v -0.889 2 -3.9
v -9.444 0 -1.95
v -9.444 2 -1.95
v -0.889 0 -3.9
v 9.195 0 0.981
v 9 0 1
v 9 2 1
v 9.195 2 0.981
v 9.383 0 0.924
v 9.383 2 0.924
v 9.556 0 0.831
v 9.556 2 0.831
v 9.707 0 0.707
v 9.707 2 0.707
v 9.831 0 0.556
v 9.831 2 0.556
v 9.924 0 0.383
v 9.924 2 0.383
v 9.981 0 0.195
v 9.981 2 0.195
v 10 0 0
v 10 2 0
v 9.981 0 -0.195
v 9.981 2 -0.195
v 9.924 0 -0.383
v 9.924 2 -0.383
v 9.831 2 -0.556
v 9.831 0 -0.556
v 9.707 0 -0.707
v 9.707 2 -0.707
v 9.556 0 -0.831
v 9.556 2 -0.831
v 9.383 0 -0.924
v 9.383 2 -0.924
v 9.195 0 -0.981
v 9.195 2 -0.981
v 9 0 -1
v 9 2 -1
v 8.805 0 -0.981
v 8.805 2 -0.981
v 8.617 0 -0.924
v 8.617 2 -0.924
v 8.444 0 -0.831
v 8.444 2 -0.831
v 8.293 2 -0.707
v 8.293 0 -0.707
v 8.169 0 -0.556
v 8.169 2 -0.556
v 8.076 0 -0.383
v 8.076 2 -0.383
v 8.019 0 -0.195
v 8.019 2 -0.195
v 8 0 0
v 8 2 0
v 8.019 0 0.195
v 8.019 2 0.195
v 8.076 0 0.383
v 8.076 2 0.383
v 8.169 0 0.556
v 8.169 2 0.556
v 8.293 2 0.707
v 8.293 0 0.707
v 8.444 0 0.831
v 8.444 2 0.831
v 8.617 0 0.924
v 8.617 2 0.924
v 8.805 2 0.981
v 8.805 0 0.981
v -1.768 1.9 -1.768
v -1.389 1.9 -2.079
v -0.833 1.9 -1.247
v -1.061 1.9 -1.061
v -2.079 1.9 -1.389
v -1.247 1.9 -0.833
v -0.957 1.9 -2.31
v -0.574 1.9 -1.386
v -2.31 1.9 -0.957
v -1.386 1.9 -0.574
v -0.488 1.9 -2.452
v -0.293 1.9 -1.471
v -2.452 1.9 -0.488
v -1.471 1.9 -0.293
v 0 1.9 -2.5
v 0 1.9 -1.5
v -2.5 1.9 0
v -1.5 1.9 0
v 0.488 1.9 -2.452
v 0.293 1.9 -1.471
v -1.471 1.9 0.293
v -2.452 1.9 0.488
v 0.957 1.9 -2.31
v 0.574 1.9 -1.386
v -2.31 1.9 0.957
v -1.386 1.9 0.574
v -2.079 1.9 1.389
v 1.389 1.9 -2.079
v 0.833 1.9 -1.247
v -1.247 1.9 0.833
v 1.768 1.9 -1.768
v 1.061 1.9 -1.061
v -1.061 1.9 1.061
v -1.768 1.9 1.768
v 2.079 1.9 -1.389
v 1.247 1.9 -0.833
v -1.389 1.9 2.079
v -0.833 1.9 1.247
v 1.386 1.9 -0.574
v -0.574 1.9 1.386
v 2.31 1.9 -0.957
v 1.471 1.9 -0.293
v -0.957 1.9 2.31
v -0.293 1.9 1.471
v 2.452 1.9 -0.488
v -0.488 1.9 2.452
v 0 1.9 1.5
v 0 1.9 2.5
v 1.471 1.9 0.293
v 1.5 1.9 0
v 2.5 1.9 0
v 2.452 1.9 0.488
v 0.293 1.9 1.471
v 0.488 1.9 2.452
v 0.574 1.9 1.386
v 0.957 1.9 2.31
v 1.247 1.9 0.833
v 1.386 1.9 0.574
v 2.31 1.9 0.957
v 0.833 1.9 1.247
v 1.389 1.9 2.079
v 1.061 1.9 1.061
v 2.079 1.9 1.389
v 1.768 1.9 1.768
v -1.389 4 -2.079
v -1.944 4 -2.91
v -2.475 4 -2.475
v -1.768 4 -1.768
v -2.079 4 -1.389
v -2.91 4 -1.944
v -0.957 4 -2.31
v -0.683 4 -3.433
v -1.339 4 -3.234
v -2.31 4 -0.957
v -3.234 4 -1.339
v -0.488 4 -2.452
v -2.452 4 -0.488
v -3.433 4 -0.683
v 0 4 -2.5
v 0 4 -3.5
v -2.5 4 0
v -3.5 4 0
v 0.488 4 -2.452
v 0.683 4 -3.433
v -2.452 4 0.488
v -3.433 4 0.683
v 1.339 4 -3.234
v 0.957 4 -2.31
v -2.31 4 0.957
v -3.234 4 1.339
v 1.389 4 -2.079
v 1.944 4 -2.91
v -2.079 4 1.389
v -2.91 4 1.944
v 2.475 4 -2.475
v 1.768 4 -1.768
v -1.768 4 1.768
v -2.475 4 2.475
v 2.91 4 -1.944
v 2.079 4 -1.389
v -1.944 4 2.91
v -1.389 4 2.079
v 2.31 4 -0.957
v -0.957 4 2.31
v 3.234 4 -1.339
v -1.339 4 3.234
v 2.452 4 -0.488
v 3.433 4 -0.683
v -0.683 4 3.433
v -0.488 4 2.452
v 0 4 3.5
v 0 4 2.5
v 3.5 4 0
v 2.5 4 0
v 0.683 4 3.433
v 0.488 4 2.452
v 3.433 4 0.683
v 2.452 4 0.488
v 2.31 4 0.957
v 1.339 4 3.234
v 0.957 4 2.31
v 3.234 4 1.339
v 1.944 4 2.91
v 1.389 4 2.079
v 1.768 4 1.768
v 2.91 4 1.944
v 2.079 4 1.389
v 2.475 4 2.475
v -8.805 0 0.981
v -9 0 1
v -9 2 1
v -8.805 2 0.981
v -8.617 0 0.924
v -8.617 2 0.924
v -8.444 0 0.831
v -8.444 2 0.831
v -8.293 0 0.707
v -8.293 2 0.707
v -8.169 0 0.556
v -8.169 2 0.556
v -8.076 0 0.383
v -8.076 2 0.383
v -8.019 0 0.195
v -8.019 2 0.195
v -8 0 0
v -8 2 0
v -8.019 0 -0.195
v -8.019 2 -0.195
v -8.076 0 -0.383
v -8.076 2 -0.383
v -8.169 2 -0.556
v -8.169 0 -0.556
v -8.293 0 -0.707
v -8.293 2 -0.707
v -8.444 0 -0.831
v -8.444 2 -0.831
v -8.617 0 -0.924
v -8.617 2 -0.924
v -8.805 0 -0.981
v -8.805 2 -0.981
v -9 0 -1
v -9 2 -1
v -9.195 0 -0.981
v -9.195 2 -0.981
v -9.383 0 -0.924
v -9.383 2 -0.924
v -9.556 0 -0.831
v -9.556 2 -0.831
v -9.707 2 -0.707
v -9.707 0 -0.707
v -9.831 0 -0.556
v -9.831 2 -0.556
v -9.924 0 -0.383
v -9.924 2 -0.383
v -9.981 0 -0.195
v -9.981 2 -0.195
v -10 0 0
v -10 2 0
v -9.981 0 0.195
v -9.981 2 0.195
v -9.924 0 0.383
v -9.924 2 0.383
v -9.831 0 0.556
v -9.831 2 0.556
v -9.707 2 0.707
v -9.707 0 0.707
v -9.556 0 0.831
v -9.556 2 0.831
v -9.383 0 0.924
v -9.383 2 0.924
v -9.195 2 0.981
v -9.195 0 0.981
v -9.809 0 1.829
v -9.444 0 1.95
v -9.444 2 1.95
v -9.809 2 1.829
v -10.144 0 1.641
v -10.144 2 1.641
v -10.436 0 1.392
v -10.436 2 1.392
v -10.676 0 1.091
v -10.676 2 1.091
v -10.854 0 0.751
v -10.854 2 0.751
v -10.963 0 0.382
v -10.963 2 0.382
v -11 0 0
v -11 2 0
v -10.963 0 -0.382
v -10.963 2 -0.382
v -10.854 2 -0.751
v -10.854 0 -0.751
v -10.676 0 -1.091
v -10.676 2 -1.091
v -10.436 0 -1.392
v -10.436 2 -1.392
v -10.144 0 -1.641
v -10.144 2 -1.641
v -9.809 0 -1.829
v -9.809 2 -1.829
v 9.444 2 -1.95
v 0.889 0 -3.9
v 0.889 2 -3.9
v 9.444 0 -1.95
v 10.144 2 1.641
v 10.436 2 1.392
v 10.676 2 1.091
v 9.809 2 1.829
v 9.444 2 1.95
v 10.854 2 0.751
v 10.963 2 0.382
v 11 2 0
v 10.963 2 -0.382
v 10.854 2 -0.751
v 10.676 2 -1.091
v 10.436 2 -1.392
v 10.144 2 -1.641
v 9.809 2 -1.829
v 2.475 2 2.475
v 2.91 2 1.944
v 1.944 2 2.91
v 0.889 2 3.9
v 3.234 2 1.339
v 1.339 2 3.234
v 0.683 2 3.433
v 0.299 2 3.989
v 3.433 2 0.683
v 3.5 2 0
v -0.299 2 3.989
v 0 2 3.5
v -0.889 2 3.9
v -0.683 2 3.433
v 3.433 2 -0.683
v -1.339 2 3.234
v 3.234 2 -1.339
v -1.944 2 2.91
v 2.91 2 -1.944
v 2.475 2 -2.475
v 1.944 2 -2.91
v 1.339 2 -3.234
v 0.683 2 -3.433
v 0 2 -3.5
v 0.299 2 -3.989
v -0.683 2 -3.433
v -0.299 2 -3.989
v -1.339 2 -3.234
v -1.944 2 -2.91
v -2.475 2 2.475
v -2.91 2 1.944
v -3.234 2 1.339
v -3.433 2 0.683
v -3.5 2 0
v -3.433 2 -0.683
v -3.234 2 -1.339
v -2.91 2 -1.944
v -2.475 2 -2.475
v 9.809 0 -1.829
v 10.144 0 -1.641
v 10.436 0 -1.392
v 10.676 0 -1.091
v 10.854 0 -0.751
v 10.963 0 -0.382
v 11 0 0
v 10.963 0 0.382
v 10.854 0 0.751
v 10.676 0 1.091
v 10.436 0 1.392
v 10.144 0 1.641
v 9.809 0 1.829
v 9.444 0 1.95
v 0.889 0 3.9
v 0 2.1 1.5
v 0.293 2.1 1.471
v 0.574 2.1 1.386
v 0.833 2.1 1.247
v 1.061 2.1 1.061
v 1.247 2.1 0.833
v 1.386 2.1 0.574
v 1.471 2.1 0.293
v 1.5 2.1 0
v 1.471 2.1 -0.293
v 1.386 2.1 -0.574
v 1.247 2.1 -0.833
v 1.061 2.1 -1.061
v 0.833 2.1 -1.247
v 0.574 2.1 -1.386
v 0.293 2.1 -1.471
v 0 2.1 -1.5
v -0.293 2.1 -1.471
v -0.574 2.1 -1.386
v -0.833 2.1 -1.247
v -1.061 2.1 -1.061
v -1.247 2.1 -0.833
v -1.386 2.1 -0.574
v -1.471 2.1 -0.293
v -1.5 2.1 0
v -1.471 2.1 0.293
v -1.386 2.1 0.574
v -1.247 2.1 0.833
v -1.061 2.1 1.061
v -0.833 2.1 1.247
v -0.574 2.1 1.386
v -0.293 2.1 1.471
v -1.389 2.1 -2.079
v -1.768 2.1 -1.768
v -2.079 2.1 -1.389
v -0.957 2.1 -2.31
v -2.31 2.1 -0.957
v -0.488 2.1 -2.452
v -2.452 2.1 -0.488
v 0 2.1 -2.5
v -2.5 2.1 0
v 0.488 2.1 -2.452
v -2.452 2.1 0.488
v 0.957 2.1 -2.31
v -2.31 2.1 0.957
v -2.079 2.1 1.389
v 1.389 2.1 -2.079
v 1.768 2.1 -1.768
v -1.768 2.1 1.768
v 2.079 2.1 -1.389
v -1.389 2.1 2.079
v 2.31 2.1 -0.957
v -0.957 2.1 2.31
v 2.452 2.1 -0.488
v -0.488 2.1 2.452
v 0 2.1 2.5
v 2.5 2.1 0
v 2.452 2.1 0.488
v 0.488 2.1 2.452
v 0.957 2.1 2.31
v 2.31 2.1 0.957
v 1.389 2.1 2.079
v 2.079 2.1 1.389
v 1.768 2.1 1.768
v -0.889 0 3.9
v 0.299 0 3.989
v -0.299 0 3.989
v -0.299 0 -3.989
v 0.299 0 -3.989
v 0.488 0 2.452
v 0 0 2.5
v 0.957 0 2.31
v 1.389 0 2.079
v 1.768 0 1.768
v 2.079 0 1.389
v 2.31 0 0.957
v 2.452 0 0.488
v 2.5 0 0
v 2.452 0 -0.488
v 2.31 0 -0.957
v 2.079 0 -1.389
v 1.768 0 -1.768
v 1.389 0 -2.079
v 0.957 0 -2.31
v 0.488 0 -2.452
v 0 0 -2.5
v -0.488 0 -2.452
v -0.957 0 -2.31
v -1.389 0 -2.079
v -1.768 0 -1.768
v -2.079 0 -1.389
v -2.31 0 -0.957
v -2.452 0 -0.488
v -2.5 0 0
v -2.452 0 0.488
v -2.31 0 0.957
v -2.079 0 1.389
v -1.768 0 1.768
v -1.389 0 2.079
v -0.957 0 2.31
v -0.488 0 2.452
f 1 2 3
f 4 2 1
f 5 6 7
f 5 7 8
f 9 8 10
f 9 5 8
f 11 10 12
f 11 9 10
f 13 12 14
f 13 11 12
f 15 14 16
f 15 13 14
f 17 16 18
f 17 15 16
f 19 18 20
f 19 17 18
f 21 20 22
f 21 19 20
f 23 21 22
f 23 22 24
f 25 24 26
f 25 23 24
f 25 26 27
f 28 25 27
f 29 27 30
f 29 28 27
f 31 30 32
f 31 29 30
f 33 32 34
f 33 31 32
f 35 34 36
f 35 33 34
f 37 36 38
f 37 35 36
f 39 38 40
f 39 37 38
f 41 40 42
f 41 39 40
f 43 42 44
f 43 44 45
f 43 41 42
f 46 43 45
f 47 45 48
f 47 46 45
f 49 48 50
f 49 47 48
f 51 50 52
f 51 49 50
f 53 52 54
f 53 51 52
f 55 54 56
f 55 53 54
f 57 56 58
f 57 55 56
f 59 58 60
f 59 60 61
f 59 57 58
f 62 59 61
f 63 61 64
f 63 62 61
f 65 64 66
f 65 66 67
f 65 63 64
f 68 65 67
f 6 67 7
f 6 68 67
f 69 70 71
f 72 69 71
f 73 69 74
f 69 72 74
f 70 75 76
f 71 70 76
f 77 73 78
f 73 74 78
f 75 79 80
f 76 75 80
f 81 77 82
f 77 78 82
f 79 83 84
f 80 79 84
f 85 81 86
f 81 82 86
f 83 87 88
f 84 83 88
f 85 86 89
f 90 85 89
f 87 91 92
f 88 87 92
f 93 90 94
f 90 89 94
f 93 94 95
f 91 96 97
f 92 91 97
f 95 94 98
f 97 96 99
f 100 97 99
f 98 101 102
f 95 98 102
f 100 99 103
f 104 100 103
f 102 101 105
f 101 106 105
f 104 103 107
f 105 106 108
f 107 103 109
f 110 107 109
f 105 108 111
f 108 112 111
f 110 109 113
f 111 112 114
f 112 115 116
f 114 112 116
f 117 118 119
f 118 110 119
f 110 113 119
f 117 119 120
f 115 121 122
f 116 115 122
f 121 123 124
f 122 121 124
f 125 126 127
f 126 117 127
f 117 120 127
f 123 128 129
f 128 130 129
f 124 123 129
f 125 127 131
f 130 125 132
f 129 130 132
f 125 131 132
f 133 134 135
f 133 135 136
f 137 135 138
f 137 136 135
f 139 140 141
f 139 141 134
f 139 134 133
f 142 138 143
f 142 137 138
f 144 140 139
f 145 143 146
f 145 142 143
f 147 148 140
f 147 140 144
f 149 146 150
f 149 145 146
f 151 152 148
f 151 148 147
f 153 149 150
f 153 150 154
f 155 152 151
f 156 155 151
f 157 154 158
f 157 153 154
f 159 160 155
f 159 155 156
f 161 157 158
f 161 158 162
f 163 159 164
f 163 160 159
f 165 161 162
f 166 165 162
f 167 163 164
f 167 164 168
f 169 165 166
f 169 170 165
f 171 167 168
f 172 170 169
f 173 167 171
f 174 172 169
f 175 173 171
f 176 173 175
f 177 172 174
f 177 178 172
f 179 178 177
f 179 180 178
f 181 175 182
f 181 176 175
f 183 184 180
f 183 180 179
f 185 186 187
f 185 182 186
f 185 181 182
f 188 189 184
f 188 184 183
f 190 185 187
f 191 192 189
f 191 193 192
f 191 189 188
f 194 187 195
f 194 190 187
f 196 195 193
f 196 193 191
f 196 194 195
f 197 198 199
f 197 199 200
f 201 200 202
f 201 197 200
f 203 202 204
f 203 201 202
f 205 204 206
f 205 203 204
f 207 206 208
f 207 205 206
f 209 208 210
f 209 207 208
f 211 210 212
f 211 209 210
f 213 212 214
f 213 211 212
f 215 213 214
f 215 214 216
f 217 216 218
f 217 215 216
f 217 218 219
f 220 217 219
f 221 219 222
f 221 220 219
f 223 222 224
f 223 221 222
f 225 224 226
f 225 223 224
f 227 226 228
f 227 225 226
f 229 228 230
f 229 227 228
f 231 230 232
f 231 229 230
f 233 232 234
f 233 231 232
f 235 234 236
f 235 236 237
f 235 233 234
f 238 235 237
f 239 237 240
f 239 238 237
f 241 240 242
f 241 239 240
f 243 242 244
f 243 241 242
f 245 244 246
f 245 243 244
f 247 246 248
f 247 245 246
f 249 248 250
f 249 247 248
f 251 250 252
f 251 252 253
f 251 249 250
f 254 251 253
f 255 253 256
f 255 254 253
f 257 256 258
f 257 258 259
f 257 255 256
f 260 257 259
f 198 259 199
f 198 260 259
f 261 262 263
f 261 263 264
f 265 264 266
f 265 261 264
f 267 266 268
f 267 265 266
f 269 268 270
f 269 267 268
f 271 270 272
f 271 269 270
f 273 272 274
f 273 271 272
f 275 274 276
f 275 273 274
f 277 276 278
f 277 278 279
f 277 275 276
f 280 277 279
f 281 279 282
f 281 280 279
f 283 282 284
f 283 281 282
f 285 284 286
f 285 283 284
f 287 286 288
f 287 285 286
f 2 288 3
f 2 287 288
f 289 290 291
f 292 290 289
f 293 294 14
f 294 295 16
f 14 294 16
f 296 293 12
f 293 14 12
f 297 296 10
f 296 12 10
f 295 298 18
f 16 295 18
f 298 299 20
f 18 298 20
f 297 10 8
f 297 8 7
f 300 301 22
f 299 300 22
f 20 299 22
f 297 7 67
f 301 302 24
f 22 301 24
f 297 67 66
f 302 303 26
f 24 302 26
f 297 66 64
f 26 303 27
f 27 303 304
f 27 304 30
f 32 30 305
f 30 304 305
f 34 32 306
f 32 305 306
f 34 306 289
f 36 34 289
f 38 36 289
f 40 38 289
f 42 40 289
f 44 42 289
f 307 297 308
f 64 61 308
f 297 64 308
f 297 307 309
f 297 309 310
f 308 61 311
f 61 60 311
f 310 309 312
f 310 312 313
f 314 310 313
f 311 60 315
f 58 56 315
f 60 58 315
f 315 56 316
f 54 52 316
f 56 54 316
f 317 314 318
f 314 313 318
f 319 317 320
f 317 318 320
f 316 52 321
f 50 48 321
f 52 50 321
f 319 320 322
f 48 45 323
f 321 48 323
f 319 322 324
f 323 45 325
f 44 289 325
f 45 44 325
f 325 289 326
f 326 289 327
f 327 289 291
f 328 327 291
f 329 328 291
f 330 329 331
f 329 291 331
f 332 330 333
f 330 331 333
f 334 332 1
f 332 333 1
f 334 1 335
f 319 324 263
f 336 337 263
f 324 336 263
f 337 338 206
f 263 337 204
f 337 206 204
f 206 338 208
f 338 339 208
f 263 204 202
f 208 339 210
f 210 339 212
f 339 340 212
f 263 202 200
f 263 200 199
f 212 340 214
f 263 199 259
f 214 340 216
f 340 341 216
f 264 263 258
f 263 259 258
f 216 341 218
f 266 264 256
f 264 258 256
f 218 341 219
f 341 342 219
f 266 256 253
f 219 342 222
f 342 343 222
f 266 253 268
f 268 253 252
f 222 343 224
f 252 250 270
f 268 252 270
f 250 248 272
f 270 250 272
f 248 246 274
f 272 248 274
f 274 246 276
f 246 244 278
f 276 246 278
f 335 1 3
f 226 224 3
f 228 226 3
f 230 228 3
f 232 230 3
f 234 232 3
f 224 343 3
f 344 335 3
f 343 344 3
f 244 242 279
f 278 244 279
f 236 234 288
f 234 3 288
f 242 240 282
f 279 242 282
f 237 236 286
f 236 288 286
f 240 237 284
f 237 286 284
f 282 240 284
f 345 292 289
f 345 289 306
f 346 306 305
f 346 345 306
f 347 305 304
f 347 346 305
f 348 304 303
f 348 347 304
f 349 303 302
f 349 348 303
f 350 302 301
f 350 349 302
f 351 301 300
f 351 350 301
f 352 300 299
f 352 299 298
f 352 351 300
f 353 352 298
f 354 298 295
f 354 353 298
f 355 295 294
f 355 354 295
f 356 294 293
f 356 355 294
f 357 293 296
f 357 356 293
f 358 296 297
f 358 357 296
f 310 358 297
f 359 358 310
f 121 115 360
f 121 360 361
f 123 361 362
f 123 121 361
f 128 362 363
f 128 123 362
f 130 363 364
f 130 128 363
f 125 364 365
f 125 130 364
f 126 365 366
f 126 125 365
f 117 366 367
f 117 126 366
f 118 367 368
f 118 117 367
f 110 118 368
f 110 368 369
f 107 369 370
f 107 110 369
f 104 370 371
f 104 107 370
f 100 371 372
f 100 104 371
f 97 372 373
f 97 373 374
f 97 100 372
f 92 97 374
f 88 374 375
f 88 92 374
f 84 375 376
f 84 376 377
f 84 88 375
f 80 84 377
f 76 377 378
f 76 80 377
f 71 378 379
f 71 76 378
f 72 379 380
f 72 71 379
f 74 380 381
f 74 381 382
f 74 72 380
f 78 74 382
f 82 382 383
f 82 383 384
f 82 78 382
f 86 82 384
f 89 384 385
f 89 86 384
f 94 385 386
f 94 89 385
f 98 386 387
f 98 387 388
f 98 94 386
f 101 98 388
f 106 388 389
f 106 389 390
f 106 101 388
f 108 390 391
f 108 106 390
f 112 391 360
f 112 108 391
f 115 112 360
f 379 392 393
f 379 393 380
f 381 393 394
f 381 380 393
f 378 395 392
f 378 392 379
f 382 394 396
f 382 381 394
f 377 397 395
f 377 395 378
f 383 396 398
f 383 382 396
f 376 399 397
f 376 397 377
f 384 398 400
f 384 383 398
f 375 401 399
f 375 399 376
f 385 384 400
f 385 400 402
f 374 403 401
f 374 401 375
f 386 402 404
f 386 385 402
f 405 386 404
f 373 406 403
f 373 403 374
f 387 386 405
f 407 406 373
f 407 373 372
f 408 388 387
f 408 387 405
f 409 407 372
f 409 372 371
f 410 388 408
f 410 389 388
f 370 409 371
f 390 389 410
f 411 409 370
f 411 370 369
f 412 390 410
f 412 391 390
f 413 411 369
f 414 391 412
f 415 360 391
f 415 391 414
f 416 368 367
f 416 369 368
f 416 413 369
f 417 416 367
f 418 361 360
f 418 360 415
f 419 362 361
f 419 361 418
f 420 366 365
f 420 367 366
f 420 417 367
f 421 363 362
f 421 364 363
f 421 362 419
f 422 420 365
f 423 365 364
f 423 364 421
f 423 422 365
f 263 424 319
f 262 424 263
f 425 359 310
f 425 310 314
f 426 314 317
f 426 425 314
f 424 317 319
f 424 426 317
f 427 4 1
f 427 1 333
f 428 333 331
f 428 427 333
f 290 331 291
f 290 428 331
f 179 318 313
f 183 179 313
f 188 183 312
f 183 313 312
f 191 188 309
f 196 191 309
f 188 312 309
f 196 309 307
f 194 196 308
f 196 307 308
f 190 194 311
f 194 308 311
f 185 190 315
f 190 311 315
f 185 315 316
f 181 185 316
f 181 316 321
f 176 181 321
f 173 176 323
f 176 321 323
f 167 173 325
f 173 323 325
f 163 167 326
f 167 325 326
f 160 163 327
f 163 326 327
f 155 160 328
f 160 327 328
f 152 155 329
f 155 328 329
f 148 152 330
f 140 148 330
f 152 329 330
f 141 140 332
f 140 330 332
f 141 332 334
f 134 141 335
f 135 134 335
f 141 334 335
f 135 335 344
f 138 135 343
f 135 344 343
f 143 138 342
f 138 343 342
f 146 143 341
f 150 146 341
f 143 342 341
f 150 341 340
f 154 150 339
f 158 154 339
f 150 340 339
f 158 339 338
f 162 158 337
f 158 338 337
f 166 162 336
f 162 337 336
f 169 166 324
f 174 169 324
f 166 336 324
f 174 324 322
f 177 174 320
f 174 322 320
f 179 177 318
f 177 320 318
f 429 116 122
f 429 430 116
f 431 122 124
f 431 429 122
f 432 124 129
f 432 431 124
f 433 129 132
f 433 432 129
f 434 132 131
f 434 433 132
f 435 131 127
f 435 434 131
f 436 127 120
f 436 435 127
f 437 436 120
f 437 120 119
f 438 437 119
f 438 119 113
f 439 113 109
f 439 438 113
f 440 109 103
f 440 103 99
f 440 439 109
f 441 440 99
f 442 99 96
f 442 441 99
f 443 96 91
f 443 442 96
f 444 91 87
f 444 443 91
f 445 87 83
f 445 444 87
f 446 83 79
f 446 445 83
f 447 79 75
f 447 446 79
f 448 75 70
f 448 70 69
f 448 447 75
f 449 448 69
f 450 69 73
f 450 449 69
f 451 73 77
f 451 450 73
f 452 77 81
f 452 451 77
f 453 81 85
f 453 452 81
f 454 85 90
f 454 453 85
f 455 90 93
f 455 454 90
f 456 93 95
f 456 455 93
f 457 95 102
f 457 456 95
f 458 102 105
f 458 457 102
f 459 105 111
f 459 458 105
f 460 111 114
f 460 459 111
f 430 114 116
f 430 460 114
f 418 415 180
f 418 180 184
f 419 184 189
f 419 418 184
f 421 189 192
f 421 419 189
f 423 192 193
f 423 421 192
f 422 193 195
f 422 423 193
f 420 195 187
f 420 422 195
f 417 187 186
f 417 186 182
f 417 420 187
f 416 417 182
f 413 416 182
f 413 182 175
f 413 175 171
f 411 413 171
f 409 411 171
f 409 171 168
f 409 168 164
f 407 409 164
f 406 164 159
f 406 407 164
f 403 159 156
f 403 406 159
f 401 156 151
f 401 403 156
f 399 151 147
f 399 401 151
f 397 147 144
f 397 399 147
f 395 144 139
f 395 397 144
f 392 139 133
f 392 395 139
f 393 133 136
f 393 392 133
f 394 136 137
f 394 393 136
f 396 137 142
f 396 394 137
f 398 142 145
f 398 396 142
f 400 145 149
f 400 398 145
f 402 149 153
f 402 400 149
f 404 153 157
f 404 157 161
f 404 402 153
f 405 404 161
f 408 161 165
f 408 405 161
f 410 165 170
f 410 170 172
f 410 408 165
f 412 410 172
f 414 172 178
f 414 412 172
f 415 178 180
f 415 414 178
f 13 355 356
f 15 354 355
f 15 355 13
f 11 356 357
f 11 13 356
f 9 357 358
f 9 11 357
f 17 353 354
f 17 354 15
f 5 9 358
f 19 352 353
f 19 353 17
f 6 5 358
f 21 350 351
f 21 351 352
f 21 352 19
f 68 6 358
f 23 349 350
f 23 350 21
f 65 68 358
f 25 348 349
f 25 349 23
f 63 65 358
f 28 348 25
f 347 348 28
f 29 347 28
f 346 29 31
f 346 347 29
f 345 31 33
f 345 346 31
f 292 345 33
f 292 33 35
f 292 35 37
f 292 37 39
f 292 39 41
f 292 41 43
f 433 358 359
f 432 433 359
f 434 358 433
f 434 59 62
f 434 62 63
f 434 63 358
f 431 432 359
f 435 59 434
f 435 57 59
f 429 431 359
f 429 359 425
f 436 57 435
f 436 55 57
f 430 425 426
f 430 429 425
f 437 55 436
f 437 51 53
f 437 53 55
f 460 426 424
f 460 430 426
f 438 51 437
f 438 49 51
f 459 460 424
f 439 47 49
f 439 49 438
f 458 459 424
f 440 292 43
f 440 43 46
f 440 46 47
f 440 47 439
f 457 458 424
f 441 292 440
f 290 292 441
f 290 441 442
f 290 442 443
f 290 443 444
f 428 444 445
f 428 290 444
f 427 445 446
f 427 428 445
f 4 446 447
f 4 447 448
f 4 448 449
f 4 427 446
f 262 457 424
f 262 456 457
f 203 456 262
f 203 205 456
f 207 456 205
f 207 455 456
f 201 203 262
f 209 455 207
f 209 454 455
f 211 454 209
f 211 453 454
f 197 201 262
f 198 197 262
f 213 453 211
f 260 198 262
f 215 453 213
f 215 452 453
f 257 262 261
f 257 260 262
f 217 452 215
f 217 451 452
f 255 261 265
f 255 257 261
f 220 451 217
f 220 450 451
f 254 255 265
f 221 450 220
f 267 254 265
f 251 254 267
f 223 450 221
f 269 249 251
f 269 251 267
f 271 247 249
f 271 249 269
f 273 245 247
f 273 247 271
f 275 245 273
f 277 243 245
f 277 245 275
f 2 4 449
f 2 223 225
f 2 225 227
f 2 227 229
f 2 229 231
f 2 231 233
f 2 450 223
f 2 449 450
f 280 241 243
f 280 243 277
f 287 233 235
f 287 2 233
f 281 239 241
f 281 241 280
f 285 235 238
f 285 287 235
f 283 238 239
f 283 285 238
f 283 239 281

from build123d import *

# Parameters (mm, degrees)
SKETCH_1_R           = 2.5
SKETCH_1_R_2         = 1
EXTRUDE_1_DEPTH      = 2
SKETCH_2_R           = 3.5
SKETCH_2_R_2         = 2.5
EXTRUDE_2_DEPTH      = 2
EXTRUDE_3_DEPTH      = 0.1
EXTRUDE_3_DEPTH_BACK = 0.1
SKETCH_3_R           = 2.5
SKETCH_3_R_2         = 1.5


with BuildPart() as part:
    # 草圖1 → 填料-伸長1 (new body)
    with BuildSketch(Plane(origin=(0, 0, 0), x_dir=(1, 0, 0), z_dir=(0, 1, 0))):
        with BuildLine():
            Line((-9.444444444, 1.949992086), (-0.888888889, 3.899984172))
            ThreePointArc((-0.888888889, 3.899984172), (0, 4), (0.888888889, 3.899984172))
            Line((0.888888889, 3.899984172), (9.444444444, 1.949992086))
            ThreePointArc((9.444444444, 1.949992086), (11, 0), (9.444444444, -1.949992086))
            Line((9.444444444, -1.949992086), (0.888888889, -3.899984172))
            ThreePointArc((0.888888889, -3.899984172), (0, -4), (-0.888888889, -3.899984172))
            Line((-0.888888889, -3.899984172), (-9.444444444, -1.949992086))
            ThreePointArc((-9.444444444, -1.949992086), (-11, 0), (-9.444444444, 1.949992086))
        make_face()
        with Locations(Location((0, 0, 0), (0, 0, 270))):
            Circle(SKETCH_1_R, mode=Mode.SUBTRACT)
        with Locations(Location((-9, 0, 0), (0, 0, 270))):
            Circle(SKETCH_1_R_2, mode=Mode.SUBTRACT)
        with Locations(Location((9, 0, 0), (0, 0, 270))):
            Circle(SKETCH_1_R_2, mode=Mode.SUBTRACT)
    extrude(amount=EXTRUDE_1_DEPTH)

    # 草圖2 → 填料-伸長2 (add)
    with BuildSketch(Plane(origin=(0, 2, 0), x_dir=(1, 0, 0), z_dir=(0, 1, 0))):
        with Locations(Location((0, 0, 0), (0, 0, 270))):
            Circle(SKETCH_2_R)
        with Locations(Location((0, 0, 0), (0, 0, 270))):
            Circle(SKETCH_2_R_2, mode=Mode.SUBTRACT)
    extrude(amount=EXTRUDE_2_DEPTH)

    # 草圖3 → 填料-伸長3 (add, two sides: drawn at the far end of the back side and taken through both)
    with BuildSketch(Plane(origin=(0, 2, 0), x_dir=(1, 0, 0), z_dir=(0, 1, 0)).offset(-EXTRUDE_3_DEPTH_BACK)):
        with Locations(Location((0, 0, 0), (0, 0, 270))):
            Circle(SKETCH_3_R)
        with Locations(Location((0, 0, 0), (0, 0, 270))):
            Circle(SKETCH_3_R_2, mode=Mode.SUBTRACT)
    extrude(amount=EXTRUDE_3_DEPTH + EXTRUDE_3_DEPTH_BACK)


solid = part.part
